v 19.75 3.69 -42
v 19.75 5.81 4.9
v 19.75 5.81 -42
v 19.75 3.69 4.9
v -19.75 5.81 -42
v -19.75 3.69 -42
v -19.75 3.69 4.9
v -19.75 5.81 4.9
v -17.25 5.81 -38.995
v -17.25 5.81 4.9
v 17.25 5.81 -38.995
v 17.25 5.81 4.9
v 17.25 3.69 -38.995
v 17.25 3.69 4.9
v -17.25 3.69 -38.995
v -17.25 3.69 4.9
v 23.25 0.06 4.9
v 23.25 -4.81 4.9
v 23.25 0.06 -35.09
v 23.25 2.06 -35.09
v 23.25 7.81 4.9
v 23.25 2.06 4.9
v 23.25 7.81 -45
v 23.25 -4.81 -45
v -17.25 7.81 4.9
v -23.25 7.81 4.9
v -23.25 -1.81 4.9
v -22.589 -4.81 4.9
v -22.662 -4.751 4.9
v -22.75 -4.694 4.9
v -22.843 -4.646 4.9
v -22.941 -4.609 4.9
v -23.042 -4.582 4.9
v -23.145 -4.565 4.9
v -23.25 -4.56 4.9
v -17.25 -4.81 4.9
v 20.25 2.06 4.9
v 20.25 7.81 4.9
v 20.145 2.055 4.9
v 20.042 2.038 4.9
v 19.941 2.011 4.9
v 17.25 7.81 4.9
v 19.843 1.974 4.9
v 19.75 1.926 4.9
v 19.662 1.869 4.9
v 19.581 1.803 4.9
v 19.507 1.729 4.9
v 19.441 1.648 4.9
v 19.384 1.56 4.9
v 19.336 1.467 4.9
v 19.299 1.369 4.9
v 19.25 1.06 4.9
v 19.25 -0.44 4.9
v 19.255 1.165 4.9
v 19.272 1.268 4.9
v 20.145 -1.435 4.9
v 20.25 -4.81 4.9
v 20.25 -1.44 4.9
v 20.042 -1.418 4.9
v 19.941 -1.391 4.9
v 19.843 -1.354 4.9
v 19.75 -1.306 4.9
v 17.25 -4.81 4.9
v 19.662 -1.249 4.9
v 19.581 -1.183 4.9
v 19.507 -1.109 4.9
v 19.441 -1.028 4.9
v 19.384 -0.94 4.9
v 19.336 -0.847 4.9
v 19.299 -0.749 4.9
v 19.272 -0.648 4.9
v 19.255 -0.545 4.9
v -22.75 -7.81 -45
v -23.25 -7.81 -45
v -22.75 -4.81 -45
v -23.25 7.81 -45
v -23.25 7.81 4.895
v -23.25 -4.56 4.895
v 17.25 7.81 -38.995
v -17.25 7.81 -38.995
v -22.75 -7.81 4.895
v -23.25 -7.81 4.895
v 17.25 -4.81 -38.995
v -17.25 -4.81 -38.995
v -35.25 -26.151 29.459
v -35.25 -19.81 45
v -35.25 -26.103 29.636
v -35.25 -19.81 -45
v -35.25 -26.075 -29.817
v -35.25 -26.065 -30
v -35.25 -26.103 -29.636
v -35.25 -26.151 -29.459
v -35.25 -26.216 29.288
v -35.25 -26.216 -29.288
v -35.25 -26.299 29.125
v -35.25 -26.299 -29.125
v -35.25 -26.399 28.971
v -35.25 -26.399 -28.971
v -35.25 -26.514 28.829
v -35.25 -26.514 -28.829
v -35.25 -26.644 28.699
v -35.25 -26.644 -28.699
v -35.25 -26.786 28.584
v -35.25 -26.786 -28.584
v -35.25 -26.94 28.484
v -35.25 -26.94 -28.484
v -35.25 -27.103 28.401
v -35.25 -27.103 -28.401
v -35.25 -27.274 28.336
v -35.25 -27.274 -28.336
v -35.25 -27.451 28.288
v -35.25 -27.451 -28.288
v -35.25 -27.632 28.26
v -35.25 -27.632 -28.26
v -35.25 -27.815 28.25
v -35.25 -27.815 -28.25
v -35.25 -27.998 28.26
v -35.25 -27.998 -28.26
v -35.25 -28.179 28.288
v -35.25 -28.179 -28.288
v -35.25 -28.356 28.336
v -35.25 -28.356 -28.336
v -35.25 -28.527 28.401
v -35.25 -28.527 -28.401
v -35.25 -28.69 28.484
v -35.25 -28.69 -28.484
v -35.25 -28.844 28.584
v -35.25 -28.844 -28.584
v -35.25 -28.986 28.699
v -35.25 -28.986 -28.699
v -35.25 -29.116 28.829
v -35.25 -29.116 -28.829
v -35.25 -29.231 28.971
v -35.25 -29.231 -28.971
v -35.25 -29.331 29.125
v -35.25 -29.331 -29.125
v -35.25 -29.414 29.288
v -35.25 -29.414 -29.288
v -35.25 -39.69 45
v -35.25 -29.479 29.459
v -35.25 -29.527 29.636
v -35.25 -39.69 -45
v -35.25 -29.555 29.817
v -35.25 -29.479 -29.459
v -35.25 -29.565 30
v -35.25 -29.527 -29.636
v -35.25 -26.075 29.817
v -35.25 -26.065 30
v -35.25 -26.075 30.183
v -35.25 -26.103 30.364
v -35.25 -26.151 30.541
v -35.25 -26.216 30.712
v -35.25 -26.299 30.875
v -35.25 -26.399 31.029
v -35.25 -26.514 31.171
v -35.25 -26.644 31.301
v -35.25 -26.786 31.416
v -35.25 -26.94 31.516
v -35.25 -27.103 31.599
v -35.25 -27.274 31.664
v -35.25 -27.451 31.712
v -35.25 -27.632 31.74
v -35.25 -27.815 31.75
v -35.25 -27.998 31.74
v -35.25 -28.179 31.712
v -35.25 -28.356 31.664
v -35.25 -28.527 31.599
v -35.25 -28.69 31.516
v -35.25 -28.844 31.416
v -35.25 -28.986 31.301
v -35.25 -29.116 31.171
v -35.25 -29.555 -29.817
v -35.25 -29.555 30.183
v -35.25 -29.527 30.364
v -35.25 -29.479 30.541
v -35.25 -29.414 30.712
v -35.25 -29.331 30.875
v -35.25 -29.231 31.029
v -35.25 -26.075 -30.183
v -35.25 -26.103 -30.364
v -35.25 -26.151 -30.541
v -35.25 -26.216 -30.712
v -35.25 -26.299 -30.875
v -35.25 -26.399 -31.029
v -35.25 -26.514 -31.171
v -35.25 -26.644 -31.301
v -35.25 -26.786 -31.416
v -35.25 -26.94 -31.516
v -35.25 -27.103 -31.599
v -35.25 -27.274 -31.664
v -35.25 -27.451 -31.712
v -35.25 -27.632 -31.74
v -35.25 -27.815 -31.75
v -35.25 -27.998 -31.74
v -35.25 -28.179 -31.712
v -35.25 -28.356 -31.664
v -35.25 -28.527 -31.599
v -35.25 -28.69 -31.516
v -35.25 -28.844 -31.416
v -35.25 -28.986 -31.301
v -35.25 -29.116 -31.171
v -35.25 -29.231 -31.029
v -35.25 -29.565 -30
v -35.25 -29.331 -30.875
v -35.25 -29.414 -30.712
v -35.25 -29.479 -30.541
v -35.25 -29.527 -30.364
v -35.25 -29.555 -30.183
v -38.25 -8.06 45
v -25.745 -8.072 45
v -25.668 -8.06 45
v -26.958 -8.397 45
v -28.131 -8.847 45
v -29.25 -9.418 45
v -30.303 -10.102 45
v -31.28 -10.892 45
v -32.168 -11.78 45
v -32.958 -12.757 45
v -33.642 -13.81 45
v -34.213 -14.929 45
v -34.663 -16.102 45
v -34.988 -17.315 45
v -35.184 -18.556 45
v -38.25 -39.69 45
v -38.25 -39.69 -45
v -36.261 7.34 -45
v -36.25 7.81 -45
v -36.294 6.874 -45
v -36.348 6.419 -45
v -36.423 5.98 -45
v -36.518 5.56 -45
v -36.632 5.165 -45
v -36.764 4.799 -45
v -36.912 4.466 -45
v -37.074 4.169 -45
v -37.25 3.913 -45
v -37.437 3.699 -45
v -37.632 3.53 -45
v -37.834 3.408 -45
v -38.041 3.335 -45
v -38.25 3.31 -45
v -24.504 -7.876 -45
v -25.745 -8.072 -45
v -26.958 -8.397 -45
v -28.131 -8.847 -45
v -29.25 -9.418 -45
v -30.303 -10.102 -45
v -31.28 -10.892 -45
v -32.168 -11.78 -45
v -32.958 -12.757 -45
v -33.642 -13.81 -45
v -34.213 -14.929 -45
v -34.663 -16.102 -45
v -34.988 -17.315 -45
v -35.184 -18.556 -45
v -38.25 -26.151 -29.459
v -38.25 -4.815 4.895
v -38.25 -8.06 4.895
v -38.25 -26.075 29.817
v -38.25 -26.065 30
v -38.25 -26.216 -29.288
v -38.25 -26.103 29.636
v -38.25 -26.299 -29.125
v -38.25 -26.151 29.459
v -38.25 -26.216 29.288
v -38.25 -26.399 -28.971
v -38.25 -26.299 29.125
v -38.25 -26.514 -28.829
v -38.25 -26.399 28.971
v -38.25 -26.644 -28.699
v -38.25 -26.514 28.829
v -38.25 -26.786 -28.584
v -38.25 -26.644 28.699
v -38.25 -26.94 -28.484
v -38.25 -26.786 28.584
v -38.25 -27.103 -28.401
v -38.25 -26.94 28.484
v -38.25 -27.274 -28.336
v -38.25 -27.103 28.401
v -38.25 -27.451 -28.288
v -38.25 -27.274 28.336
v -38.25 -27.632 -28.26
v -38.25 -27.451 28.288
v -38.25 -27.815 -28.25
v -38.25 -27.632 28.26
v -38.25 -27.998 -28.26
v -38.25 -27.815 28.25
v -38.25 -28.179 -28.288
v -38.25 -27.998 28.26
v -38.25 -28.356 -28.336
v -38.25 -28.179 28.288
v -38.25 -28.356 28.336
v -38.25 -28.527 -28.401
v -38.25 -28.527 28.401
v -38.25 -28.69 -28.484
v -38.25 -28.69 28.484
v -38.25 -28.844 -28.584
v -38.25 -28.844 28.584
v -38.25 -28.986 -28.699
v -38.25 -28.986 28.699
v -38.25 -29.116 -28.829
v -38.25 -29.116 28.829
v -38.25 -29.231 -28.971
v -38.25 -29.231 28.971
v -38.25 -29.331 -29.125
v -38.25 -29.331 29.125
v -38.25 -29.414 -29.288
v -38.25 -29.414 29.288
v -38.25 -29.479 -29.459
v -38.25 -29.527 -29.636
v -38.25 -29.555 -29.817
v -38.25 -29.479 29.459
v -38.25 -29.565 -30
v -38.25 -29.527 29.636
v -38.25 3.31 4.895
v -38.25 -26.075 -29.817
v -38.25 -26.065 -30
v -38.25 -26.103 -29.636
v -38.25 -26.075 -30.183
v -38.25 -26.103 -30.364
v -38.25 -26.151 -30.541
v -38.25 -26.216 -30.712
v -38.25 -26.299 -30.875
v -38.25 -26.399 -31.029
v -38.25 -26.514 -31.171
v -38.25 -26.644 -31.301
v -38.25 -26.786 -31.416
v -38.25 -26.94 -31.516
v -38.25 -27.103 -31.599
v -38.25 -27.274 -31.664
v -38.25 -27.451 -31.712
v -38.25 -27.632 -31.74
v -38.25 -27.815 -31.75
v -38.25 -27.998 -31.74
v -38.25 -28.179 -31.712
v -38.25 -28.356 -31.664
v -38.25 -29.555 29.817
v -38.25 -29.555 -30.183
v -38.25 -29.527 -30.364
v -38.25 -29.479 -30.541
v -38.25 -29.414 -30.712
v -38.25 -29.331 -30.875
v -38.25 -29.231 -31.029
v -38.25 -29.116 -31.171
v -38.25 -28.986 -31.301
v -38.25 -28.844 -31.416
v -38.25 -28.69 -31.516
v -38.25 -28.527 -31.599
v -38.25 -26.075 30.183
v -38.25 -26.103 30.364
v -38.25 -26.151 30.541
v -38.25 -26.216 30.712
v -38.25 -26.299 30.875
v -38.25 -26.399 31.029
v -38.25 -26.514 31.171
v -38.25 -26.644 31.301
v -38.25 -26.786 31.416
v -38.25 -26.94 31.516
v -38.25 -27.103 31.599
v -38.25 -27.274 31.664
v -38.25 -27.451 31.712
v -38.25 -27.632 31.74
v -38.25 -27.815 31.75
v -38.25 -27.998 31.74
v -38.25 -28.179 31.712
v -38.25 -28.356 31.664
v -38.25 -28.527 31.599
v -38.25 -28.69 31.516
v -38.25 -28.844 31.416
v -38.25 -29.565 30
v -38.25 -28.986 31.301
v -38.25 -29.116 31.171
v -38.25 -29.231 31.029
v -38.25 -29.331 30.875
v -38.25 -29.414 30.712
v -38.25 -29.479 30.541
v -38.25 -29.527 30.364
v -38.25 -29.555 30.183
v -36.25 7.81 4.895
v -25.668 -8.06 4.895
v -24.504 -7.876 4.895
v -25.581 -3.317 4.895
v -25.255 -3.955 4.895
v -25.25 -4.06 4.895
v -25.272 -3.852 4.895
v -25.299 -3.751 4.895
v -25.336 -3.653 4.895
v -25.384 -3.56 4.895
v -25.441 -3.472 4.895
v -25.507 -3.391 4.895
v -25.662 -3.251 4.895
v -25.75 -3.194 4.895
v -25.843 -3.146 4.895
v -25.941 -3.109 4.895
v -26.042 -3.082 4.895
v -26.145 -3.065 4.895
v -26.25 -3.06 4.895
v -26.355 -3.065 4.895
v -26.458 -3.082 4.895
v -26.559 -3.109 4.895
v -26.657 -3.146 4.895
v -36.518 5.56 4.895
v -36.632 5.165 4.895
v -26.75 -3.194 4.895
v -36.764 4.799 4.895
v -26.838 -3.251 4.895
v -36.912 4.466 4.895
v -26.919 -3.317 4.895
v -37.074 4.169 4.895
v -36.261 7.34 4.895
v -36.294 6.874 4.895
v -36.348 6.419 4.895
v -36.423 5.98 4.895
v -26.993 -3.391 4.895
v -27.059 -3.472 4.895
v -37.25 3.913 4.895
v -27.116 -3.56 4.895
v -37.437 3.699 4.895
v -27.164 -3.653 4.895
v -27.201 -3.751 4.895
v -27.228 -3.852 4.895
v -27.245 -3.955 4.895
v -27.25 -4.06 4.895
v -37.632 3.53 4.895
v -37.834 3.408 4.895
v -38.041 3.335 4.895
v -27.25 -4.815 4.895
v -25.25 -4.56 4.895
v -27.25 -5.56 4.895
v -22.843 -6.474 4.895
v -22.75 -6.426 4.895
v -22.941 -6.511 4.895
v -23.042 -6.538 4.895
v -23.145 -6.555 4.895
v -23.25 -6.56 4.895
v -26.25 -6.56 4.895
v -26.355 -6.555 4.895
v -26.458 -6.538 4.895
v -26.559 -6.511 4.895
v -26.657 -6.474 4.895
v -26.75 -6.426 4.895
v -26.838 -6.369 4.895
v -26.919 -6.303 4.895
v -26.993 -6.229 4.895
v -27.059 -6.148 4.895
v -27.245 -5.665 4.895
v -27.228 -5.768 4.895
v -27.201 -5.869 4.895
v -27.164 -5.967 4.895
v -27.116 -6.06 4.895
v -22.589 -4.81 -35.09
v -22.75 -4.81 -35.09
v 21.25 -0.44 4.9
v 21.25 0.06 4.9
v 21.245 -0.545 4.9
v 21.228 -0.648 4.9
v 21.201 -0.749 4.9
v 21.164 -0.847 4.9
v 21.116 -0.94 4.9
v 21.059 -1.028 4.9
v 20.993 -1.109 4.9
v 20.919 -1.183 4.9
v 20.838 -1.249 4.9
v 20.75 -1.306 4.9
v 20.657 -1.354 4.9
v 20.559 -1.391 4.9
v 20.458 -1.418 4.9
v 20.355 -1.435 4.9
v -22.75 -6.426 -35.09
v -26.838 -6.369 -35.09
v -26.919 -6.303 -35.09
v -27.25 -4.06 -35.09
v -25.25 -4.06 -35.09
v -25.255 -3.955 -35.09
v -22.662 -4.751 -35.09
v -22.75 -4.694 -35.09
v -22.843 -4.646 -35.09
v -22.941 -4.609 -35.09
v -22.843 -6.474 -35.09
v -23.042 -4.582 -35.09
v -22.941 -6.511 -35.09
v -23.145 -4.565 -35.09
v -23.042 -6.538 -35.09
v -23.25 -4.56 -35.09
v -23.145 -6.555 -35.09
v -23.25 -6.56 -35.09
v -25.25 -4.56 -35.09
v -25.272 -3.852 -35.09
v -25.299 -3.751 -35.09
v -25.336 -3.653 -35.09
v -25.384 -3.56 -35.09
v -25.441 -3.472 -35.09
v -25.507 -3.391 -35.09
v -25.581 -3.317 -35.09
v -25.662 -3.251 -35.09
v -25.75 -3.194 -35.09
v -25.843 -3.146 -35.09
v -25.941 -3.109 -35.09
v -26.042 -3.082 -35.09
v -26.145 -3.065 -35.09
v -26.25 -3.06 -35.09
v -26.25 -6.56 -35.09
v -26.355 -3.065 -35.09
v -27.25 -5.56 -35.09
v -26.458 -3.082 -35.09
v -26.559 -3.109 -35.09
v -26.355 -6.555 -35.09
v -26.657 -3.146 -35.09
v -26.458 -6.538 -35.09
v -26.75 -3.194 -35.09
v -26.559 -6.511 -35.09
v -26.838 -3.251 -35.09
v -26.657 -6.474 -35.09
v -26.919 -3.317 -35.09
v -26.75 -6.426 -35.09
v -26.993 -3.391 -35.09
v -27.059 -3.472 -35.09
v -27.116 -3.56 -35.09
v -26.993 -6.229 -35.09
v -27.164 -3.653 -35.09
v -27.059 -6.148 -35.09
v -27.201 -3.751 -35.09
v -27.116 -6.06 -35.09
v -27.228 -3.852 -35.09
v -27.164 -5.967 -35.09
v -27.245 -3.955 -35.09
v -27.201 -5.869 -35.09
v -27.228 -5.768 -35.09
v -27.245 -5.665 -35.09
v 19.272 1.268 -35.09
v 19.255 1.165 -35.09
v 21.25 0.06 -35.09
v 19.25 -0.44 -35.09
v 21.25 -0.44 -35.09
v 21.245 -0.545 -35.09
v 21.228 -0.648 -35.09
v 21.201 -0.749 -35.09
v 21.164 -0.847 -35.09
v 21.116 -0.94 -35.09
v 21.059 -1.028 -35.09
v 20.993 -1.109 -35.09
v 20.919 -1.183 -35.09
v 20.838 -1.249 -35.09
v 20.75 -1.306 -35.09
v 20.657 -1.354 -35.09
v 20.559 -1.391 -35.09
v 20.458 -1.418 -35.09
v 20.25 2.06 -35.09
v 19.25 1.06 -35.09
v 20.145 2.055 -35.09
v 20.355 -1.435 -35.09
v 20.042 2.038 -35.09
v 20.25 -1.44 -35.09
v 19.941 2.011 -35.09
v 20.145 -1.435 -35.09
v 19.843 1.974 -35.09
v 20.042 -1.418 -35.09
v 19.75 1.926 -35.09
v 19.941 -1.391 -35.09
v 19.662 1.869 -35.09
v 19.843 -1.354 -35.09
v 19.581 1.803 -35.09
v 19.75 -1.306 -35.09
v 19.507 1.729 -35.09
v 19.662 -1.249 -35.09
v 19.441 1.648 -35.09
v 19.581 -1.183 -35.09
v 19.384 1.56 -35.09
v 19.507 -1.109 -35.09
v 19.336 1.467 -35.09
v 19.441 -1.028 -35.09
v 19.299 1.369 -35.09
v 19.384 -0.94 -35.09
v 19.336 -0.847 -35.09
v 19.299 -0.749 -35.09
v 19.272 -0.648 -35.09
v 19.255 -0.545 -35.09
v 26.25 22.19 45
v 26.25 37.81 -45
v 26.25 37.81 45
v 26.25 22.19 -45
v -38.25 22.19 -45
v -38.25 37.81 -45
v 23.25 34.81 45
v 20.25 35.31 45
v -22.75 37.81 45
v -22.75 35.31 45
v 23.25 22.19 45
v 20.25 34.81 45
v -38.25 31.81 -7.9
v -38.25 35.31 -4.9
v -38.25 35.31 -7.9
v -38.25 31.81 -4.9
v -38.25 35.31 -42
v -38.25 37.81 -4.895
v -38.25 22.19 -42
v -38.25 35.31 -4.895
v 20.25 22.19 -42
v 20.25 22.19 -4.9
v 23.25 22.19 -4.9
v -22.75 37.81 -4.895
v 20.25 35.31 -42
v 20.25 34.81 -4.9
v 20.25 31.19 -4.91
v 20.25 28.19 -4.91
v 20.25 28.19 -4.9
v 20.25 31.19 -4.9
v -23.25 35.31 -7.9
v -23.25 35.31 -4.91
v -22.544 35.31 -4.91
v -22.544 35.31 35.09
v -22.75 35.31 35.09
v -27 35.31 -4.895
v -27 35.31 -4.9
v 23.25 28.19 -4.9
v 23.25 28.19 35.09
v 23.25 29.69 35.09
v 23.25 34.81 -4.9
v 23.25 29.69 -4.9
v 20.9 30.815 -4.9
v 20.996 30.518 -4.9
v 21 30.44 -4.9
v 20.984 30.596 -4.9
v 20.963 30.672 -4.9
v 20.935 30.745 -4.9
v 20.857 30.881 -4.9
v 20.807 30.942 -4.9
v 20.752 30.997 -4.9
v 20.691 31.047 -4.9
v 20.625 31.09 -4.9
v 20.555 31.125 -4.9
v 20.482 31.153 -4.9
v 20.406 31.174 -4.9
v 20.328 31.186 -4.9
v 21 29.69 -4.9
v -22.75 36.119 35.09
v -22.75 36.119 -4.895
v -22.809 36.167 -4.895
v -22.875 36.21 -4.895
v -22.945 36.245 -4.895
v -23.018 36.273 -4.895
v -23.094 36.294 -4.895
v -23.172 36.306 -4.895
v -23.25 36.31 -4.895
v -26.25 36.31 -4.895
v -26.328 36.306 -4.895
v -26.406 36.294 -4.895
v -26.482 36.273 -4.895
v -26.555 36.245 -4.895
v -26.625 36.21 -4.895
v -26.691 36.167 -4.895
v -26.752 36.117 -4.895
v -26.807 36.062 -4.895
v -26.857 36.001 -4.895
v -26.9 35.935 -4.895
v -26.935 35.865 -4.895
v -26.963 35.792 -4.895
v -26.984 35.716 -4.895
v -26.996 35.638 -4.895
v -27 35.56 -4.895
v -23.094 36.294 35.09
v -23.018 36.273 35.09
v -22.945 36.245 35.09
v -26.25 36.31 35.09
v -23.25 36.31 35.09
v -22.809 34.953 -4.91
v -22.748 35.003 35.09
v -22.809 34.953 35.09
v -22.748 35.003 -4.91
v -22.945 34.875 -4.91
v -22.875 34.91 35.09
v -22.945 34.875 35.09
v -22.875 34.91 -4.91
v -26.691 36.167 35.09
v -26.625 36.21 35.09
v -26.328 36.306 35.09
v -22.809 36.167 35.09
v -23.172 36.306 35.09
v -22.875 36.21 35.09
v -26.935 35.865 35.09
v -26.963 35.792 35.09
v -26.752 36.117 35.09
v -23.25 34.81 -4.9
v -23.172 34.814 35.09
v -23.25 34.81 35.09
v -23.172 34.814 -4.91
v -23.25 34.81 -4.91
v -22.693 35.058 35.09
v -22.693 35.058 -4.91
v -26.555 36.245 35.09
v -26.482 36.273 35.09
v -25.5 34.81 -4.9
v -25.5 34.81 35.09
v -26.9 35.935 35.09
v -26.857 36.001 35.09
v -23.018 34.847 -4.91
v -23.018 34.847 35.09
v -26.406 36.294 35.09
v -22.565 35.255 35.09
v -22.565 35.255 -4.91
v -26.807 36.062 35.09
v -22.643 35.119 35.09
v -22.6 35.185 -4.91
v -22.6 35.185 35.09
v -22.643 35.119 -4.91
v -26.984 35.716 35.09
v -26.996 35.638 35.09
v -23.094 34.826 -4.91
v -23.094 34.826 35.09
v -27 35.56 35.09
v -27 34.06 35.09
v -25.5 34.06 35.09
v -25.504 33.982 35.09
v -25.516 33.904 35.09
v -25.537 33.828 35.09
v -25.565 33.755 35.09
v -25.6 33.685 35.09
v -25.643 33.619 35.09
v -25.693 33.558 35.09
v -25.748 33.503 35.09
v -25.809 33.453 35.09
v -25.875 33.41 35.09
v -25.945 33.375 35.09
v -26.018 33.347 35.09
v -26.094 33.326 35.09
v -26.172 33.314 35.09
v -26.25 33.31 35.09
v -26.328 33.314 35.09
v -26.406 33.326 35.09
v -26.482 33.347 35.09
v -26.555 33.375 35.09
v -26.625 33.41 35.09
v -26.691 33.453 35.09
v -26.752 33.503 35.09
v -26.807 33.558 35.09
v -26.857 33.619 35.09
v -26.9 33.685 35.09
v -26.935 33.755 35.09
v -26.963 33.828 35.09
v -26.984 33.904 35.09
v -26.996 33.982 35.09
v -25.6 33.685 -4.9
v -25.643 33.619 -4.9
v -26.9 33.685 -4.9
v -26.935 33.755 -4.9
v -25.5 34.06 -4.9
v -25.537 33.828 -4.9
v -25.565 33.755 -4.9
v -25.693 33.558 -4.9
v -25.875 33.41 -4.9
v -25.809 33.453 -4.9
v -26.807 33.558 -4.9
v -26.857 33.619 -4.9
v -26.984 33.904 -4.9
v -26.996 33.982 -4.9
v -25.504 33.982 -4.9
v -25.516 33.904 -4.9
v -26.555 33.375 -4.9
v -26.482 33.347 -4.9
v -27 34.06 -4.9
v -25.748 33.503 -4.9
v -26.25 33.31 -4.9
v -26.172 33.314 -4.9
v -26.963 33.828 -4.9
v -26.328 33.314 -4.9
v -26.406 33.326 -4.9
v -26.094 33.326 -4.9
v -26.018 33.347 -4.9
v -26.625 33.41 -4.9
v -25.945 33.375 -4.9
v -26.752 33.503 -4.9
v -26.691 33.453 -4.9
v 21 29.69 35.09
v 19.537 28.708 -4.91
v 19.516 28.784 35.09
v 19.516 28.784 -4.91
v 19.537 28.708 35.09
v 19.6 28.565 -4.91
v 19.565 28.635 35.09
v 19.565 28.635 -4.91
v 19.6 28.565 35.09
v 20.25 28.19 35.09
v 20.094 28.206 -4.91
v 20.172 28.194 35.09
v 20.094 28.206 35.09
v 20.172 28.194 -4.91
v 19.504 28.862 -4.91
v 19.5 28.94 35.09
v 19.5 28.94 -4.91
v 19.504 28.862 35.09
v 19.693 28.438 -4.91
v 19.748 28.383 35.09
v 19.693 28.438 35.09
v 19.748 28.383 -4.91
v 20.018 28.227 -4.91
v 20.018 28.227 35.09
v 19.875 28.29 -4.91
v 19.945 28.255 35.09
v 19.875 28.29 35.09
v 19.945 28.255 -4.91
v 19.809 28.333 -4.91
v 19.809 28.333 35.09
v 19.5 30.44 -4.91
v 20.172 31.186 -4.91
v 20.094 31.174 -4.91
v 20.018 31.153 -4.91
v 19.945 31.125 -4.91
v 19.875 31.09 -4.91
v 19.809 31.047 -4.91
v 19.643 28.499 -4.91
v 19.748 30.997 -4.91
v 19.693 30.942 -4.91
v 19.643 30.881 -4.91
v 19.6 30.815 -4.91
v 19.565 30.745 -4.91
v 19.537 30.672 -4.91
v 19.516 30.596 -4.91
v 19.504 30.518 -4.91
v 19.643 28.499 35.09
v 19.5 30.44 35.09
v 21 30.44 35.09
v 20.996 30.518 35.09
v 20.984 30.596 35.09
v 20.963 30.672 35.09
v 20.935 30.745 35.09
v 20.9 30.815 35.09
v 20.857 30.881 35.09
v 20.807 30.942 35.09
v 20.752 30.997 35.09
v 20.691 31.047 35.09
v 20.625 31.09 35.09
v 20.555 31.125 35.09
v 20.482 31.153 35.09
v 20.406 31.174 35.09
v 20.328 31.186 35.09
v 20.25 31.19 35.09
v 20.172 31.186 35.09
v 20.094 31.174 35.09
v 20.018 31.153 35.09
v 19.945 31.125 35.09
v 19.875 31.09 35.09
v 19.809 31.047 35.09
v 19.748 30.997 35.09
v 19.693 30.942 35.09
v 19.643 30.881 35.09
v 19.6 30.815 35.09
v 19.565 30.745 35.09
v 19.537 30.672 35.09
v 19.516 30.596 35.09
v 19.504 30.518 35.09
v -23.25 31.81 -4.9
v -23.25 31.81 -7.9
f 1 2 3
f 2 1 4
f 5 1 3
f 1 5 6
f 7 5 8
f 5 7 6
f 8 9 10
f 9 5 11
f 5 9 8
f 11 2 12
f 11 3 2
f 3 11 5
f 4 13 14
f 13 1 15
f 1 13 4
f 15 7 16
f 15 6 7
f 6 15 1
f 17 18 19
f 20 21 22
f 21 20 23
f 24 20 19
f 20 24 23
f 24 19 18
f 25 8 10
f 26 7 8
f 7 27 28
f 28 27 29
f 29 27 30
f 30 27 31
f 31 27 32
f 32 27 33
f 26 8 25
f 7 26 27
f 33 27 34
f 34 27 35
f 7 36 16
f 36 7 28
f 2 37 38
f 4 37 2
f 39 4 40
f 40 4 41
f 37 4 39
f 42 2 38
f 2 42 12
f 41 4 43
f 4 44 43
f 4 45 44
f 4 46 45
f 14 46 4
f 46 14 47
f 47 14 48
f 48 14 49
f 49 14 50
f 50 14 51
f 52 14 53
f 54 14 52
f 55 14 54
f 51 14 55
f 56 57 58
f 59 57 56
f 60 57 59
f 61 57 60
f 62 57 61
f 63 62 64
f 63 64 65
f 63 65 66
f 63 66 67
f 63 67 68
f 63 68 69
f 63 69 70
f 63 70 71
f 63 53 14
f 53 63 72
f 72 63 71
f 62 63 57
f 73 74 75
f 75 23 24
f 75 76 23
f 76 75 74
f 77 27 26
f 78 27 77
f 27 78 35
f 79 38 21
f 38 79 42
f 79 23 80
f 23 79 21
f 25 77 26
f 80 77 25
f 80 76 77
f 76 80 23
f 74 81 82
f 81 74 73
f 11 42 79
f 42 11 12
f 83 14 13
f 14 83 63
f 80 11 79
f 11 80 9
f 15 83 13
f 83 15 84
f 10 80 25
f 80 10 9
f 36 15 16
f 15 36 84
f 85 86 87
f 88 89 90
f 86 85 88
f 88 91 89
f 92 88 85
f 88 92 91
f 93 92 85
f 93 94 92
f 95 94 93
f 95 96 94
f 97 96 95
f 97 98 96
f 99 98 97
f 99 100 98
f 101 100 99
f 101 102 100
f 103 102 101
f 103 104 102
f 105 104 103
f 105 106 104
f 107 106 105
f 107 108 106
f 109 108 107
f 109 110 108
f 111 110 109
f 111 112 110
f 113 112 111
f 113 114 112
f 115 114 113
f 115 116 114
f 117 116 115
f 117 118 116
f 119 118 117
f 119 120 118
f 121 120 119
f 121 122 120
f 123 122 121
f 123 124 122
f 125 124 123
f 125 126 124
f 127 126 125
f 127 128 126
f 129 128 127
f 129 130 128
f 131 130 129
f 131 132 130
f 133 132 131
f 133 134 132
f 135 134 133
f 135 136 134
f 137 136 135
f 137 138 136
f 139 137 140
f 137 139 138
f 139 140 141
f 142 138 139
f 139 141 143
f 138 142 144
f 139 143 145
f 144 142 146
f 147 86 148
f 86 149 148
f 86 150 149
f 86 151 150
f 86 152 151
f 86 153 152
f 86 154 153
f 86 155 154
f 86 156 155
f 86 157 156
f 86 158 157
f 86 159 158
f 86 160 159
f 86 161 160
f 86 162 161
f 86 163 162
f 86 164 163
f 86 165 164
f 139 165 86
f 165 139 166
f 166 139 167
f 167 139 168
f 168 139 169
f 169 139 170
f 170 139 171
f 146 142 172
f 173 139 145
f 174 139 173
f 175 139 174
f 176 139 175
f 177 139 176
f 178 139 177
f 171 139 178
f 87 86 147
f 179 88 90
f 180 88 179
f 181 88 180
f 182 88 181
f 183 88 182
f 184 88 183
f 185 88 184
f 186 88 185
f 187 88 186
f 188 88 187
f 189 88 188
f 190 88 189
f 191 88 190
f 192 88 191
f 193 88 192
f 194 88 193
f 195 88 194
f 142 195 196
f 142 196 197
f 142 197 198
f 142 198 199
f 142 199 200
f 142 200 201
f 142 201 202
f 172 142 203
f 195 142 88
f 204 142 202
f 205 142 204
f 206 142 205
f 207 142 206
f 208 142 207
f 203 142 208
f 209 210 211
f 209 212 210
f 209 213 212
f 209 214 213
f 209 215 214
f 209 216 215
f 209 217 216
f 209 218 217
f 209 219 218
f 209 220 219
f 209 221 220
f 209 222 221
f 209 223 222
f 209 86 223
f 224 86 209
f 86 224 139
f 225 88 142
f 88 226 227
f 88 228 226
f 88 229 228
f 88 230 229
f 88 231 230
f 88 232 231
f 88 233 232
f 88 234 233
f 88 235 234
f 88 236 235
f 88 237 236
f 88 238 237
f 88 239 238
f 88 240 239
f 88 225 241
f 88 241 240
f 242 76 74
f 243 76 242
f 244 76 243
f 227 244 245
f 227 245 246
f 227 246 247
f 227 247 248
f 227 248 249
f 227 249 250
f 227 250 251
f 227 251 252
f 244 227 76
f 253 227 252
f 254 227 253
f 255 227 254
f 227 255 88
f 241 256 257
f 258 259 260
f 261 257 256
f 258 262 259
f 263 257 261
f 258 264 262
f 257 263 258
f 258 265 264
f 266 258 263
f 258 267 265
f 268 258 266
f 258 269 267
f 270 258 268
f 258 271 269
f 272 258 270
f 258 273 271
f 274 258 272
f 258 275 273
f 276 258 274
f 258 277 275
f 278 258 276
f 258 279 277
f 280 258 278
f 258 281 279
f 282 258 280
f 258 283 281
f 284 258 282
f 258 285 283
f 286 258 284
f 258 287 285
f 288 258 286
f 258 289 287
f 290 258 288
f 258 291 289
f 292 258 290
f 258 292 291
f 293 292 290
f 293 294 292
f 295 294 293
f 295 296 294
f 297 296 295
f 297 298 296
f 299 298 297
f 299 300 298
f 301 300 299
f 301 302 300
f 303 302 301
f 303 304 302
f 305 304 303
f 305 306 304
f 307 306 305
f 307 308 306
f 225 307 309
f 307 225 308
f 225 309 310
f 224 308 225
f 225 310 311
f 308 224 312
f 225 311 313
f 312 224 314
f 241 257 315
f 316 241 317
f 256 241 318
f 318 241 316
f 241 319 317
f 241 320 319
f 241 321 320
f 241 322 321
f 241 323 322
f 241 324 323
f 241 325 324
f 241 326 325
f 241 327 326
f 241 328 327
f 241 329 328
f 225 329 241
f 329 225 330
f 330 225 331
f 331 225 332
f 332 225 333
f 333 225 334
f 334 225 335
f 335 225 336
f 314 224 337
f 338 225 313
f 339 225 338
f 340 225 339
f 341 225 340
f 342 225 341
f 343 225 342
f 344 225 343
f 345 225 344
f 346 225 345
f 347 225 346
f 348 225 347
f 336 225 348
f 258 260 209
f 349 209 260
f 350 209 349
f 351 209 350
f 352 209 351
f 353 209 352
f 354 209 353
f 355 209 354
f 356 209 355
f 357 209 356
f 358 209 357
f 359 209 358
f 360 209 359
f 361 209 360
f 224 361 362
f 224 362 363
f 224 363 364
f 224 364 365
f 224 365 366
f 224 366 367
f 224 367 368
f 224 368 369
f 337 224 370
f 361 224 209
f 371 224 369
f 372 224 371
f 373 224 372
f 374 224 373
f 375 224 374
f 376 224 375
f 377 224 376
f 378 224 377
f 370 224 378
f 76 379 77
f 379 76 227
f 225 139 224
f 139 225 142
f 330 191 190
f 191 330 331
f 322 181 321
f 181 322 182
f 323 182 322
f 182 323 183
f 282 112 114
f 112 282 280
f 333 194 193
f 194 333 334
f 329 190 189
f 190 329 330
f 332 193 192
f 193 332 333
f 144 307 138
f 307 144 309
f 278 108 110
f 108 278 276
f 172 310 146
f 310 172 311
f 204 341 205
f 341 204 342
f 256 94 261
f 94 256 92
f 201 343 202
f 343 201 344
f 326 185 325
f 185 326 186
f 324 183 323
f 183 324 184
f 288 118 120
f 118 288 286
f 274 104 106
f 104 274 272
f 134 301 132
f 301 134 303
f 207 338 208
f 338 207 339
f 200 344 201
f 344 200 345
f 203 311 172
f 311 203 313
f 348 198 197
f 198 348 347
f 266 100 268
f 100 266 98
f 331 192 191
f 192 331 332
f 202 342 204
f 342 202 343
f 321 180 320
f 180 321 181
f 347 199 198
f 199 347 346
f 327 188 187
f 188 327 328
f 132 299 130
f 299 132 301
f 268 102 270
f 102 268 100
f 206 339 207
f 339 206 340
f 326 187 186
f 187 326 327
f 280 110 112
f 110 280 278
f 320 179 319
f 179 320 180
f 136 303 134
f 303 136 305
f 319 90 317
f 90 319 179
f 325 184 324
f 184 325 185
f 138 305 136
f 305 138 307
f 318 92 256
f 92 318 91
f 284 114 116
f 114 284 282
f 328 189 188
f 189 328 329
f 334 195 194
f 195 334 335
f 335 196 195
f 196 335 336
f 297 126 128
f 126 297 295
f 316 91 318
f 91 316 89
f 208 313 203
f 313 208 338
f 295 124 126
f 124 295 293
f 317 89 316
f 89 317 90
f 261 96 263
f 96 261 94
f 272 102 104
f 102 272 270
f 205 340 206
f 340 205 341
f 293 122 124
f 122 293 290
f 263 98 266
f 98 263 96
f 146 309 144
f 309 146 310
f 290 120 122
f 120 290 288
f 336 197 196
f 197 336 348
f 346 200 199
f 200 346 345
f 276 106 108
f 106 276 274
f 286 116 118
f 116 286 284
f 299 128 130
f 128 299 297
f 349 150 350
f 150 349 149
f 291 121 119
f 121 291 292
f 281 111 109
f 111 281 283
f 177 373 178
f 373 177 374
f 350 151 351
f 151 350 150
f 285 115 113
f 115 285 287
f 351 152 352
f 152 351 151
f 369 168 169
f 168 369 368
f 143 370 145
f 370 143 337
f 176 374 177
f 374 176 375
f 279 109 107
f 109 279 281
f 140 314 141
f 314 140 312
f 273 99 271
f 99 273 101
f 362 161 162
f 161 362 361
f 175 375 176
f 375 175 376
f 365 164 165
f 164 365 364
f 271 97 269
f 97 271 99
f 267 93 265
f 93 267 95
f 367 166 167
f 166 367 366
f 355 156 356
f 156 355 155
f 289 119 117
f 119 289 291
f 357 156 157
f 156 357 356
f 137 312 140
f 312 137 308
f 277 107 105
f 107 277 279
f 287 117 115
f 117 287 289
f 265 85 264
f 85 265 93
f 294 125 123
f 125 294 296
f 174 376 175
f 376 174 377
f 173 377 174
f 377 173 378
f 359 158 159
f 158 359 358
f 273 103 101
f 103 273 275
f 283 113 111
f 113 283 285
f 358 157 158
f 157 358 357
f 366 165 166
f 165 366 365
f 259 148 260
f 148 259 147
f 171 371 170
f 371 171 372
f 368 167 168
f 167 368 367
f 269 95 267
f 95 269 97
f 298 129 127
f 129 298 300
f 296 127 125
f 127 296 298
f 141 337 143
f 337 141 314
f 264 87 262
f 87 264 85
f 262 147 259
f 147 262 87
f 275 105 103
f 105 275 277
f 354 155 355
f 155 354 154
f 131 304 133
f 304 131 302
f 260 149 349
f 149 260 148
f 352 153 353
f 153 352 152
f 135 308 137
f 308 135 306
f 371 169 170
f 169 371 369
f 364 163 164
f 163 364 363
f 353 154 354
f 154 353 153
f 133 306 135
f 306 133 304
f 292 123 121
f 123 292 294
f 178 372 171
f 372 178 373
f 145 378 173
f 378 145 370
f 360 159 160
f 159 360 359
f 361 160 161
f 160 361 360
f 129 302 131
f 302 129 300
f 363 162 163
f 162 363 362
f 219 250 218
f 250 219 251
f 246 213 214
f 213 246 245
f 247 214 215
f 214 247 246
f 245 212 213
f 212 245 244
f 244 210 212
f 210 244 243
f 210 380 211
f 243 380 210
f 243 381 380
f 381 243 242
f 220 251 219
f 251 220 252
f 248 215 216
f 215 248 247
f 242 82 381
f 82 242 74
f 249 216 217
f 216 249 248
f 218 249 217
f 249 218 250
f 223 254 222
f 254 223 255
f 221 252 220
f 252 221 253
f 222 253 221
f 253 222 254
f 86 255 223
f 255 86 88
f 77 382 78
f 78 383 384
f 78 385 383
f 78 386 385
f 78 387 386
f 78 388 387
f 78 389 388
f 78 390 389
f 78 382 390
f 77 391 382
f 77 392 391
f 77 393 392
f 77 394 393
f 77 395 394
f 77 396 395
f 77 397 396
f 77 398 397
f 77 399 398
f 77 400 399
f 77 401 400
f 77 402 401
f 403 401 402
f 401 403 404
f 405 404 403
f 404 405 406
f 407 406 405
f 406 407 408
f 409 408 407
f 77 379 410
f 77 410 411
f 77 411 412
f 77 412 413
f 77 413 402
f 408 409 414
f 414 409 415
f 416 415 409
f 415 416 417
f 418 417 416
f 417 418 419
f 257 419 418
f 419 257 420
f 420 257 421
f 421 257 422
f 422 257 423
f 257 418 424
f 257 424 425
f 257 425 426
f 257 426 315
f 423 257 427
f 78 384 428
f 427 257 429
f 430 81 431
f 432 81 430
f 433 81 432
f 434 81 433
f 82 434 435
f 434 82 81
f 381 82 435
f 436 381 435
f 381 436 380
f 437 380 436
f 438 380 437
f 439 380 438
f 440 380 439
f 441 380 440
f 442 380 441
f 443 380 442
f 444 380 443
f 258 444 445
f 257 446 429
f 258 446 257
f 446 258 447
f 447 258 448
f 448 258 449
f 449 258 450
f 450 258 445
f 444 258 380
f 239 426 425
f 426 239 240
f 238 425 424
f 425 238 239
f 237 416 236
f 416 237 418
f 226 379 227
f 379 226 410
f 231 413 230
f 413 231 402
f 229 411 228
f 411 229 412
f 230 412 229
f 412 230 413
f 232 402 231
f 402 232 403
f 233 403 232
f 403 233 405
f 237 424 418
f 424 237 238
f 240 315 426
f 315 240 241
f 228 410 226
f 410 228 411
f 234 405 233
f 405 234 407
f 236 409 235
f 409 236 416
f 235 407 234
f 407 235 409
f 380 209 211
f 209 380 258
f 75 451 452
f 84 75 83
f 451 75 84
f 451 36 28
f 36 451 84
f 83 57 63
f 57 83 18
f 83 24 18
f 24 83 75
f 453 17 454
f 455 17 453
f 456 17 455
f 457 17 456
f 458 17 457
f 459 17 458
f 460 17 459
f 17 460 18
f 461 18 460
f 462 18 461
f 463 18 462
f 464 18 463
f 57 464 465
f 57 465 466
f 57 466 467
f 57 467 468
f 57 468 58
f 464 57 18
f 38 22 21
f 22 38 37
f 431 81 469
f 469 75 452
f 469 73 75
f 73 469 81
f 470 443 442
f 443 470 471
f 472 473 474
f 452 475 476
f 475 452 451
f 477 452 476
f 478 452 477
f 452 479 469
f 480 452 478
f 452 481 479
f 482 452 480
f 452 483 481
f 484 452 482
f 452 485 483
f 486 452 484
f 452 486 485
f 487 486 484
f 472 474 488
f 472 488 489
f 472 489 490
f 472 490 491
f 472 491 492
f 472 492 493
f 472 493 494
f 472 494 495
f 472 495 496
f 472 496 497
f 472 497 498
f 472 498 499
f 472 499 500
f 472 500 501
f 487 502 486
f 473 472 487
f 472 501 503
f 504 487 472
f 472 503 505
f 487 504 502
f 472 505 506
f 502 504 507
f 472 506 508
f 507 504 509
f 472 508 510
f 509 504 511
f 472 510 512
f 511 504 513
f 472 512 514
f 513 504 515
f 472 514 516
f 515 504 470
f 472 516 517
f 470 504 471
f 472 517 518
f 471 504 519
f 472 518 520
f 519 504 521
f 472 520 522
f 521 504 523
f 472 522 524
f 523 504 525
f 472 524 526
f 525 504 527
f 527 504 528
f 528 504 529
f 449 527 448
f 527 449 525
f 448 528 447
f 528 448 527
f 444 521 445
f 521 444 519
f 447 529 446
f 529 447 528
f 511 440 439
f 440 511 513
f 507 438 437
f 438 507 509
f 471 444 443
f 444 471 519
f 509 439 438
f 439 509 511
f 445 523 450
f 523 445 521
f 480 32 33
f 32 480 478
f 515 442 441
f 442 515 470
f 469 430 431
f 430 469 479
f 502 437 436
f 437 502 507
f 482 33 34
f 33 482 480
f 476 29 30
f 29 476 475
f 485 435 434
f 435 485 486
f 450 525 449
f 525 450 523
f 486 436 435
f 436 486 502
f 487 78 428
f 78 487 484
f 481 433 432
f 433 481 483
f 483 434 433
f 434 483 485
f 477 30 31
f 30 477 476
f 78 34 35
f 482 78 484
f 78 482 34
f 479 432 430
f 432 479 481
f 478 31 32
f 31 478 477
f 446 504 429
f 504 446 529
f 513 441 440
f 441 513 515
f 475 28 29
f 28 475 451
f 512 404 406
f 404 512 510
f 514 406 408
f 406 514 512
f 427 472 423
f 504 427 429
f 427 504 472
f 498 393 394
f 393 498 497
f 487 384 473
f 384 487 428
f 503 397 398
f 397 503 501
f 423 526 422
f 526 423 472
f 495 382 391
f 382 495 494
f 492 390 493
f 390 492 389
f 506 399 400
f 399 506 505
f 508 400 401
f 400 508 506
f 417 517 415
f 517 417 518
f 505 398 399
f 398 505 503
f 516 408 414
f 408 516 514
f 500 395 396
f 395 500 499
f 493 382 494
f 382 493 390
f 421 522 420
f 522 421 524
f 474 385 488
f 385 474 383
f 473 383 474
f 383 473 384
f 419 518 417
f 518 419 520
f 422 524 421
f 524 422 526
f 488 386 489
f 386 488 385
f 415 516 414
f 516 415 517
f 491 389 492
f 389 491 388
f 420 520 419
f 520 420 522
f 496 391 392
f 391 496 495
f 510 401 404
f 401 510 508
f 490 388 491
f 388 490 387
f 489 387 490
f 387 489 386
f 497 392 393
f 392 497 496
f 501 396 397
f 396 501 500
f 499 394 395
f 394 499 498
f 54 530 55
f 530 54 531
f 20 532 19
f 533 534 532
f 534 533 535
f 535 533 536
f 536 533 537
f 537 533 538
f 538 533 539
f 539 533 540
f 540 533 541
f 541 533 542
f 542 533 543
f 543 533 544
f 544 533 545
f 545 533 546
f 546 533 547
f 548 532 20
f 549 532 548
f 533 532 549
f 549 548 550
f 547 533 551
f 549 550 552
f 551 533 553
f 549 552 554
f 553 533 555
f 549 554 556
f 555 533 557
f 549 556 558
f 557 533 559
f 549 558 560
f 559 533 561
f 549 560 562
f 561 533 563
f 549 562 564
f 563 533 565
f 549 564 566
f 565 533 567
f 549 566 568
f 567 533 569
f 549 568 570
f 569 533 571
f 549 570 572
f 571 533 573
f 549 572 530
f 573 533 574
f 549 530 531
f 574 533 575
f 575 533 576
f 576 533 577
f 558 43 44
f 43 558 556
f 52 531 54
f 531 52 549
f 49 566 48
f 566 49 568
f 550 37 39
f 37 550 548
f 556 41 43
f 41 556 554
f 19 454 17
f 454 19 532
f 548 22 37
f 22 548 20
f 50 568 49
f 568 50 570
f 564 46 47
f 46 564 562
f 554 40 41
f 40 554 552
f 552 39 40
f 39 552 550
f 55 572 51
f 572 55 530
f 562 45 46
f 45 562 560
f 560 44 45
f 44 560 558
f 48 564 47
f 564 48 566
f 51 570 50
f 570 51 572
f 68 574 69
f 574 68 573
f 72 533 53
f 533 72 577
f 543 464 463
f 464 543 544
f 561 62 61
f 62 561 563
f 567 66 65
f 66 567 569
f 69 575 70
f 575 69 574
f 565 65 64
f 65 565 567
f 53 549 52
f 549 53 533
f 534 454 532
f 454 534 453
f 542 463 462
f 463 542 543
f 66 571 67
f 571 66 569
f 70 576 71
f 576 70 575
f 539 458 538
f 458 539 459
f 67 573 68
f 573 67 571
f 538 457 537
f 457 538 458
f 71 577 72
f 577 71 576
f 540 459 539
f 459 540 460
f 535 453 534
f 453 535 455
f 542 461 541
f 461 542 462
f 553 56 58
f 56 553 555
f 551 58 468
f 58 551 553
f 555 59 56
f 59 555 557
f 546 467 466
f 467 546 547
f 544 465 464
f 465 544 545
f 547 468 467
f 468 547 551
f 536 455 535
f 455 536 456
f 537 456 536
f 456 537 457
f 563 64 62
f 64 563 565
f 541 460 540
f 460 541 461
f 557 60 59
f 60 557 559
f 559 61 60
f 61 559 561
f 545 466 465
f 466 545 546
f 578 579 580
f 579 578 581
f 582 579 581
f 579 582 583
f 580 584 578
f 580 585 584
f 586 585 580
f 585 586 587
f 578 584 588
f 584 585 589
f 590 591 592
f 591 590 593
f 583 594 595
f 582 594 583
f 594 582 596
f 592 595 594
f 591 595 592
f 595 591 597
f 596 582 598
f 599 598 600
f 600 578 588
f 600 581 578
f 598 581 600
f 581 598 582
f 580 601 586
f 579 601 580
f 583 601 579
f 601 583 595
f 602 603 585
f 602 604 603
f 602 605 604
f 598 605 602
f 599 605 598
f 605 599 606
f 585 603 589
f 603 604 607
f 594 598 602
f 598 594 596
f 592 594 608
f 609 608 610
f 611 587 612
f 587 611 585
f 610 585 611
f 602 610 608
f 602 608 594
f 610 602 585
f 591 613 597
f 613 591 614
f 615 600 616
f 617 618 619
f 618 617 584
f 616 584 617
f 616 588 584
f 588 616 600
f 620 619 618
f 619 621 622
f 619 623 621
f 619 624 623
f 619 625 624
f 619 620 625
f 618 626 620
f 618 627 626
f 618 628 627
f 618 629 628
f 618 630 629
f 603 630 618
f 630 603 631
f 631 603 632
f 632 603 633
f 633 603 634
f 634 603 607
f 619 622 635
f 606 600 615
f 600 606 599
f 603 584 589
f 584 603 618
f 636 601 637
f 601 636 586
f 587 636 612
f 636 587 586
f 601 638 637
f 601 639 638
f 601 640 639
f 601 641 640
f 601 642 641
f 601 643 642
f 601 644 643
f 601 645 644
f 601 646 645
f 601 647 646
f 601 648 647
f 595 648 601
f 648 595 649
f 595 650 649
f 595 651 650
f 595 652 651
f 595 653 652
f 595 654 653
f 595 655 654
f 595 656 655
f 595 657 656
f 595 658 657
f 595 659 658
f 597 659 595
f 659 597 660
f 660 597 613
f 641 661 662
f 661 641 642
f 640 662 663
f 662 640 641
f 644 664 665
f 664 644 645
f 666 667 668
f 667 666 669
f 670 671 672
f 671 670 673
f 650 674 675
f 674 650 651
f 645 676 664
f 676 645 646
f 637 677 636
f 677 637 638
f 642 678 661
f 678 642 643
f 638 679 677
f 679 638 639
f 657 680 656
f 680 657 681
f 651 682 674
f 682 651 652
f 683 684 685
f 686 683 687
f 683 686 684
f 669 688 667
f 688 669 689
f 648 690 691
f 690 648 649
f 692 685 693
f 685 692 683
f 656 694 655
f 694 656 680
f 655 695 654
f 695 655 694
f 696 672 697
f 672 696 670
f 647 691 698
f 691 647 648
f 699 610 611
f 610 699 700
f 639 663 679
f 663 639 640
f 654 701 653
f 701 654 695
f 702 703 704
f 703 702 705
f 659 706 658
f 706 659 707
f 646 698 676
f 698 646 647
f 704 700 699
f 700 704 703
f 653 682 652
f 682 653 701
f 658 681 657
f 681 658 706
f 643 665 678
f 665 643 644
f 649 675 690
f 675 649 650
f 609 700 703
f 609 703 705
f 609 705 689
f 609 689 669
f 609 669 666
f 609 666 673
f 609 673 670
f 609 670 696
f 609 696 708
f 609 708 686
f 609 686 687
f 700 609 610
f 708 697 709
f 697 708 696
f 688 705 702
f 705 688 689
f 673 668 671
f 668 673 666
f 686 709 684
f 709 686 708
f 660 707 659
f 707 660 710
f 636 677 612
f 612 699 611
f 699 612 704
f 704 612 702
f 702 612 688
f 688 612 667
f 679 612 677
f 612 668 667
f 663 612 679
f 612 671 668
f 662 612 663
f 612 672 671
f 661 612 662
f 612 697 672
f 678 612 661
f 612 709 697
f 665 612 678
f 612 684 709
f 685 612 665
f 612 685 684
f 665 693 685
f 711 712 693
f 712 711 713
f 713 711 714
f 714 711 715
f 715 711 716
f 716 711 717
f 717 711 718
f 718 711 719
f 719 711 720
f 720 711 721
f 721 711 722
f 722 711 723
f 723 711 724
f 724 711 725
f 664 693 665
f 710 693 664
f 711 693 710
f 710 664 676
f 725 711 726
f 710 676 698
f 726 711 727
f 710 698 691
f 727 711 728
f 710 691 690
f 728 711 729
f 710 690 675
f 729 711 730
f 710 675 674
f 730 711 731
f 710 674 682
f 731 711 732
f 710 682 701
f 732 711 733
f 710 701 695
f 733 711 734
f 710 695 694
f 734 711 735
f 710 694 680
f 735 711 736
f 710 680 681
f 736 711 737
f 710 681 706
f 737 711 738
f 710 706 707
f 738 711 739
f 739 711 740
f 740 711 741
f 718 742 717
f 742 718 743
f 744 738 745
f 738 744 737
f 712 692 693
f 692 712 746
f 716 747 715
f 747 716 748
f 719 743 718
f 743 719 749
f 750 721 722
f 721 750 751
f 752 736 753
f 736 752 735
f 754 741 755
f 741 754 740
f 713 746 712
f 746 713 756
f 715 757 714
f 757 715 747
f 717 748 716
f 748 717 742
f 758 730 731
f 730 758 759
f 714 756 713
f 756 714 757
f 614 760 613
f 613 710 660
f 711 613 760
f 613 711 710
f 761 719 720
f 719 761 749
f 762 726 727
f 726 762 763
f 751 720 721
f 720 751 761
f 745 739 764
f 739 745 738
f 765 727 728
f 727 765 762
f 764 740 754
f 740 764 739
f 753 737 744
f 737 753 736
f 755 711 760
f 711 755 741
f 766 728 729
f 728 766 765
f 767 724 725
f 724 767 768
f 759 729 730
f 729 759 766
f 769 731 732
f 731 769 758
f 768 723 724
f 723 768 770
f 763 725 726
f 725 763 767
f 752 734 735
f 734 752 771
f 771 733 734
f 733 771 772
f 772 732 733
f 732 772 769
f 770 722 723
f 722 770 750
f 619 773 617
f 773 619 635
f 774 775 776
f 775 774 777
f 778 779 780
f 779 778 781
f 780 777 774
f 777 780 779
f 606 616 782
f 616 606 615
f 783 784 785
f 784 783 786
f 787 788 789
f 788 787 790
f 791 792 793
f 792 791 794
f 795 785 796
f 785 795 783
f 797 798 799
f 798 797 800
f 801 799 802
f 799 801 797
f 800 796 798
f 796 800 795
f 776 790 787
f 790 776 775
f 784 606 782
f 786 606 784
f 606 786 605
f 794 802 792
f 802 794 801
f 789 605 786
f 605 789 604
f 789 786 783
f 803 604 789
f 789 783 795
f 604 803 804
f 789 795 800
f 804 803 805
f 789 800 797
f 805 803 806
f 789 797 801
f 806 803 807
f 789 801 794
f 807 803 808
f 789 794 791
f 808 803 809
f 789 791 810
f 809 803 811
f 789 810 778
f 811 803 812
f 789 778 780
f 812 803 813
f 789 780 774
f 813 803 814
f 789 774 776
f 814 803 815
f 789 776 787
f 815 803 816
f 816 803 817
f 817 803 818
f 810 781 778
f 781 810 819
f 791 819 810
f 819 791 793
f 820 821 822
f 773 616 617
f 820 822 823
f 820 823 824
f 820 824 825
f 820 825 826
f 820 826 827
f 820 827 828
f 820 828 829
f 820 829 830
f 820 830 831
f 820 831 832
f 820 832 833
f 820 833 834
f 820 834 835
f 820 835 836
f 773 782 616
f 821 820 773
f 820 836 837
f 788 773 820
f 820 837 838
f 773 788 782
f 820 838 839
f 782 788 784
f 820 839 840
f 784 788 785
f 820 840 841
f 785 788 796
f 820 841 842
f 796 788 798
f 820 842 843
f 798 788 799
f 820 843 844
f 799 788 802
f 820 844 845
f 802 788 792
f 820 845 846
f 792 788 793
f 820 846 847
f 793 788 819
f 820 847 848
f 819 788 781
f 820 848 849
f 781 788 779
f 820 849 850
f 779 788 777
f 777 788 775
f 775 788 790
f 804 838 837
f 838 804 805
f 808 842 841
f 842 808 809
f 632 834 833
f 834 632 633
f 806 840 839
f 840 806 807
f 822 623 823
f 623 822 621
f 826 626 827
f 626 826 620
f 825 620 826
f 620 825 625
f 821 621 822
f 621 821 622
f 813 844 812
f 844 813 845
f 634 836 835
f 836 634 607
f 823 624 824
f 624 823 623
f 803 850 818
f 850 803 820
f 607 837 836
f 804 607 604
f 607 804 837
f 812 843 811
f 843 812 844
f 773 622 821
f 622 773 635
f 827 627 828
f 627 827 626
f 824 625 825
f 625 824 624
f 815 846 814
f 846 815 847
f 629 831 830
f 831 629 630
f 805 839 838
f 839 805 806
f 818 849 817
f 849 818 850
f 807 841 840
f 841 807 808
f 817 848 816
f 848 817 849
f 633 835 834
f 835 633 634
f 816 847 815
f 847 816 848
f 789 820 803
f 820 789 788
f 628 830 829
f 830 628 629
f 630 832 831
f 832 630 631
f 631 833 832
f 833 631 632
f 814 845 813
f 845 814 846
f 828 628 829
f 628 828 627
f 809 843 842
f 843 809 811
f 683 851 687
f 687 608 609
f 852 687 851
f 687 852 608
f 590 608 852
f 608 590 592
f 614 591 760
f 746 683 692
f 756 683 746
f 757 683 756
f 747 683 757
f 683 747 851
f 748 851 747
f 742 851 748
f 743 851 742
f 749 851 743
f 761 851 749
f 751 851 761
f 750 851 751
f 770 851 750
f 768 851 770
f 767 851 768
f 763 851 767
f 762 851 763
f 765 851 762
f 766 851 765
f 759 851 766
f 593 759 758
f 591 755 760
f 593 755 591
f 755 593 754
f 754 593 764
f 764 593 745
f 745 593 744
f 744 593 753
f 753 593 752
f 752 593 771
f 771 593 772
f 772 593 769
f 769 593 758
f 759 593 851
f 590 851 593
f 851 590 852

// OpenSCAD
$fn = 60;
print = true;

beam_depth = 47.5;
corner_a = 8.5;
corner_b = 3.5;

wall_width = 3;
clearance = 0.5;
glass_clearance = 2;
rfid_clearance = 3.5 + 5;
mount_offset = 15;
overall_height = 60 + 30; // must be bigger than the rfid_length plus extra for cable
rivit_hole = 3.5;
rail_height = 40; // must be less than the h_height

rfid_width = 39.5;
rfid_length = 60;
rfid_depth = 1.12;
rfid_hole = 3;
rfid_holes = [
    [rfid_width/2 + 25.5/2, 6.7],
    [rfid_width/2 - 25.5/2, 6.7],
    [rfid_width/2 + 34/2, 44.4],
    [rfid_width/2 - 34/2, 44.4]
];
rfid_pin_hole = 0.9;
rfid_pin_count = 7;
rfid_pin_xy = [10,0.7];
rfid_pin_pitch = 2.54;
rfid_cap_offset = 9.9 + 2.7;

module wall () {
    height = 400;
    thick = beam_depth/2;
    length = 400;
    wthick = 5;
    translate([-thick,-beam_depth,-height/2]) cube([thick, beam_depth, height]);
    translate([-length/2,0,-height/2]) cube([length,wthick,height]);
    translate([0,0,-height/2]) resize([corner_b,0,0]) cylinder(r = corner_a, h = height);
}

module rfid (cutout = false) {
    width = rfid_width;
    depth = rfid_depth + (cutout ? clearance*2 : 0);
    length = rfid_length;
    difference() {
        union() {
            cube([width,depth,length], center=true);
            cap_height = 3.5;
            cap_width = 3.5;
            cap_length = 9.9;
            translate([-cap_width/2+width/2,-cap_height/2-depth/2,cap_length/2+length/2-rfid_cap_offset]) {
                cube([cap_width,cap_height,cap_length], center=true);
            }
        }
        if (!cutout) {
            translate([-width/2,0,-length/2]) {
                for (h = rfid_holes) {
                    translate([h[0],0,h[1]]) rotate([90,0,0]) cylinder(d = rfid_hole, h=depth + 0.02, center=true);
                }
            }
            translate([-width/2+rfid_pin_xy[0]+rfid_pin_pitch/2,0,length/2-rfid_pin_xy[1]-rfid_pin_pitch/2]) {
                for (p = [0 : 1 : rfid_pin_count]) {
                    translate([p * rfid_pin_pitch,0,0]) rotate([90,0,0]) cylinder(d = rfid_pin_hole, h=depth + 0.02, center=true);
                }
            }
        }
    }
}

h_width = rfid_width + wall_width * 2 + clearance * 2;
h_height = rfid_length - rfid_cap_offset - clearance + wall_width;
h_depth = glass_clearance + rfid_depth + rfid_clearance + clearance * 2 + wall_width;
module holder(side = -1) {
    difference() {
        union() {
            cube([h_width,h_depth,h_height], center=true);
        }
        translate([0,0,wall_width+0.01]) cube([h_width-wall_width*4,h_depth+0.02,h_height-wall_width*2+0.01], center=true);
        translate([0,h_depth/2-rfid_depth/2-glass_clearance-clearance,rfid_length/2-h_height/2+wall_width]) rfid(true);
    }

    // Mounting bracket
    spacer_width = mount_offset-wall_width;
    spacer_length = h_depth + spacer_width;
    translate([(h_width/2-wall_width/2+mount_offset)*side,-beam_depth/2+h_depth/2,overall_height/2-h_height/2]) {
        difference() {
            union() {
                cube([wall_width,beam_depth,overall_height], center=true);
                translate([(-spacer_width/2-wall_width/2)*side,beam_depth/2-spacer_length/2,0]) cube([spacer_width,spacer_length,overall_height], center=true);
            }
            translate([(-spacer_width-wall_width/2)*side,beam_depth/2-spacer_length,0]) cylinder(r = spacer_width, h=overall_height+0.02, center=true);
            translate([(-mount_offset/2+wall_width/2)*side,+beam_depth/2-h_depth/2+wall_width/2,h_height/2]) {
                cube([mount_offset+0.02,h_depth+0.01-wall_width,overall_height-h_height+0.01], center=true);
            }
            for (i = [-overall_height/3, overall_height/3]) {
                translate([0,-beam_depth/4,i]) rotate([0,90,0]) cylinder(d = rivit_hole, center=true, h=wall_width+0.02);
            }

            // Create a space for the corner tube
            c_a = corner_a + clearance;
            c_b = corner_b + clearance;
            translate([wall_width/2*side,beam_depth/2,0]) resize([c_b,0,0]) cylinder(d = c_a, h=overall_height + 0.02, center=true);
        }
    }
}

module rail(size, height, rotation, clearance) {
    hull() {
        cylinder(d=size/2+clearance, h=height, center = true);
        translate([-size,0,0]) cylinder(d=size/2+clearance, h=height, center = true);
    }
    hull () {
        translate([-size,0,0]) cylinder(d=size/2+clearance, h=height, center = true);
        translate([-size,0,0]) rotate(rotation) translate([-size/2,0,0]) cylinder(d=size/2+clearance, h=height, center = true);
    }
}

c_height = overall_height;
c_width = h_width + mount_offset+wall_width;
c_depth = h_depth;
module cover(cutout = false, side = -1) {
    width = c_width;
    height = c_height;
    depth = c_depth;
    translate([-wall_width/2*side,0,0]) {
        difference() {
            cube([width+(cutout?clearance:0),depth+(cutout?clearance:0),height+(cutout?clearance:0)], center=true);
            translate([wall_width*2*side,wall_width/2+(cutout?clearance:0),-wall_width/2-5]) cube([width,depth-wall_width+1,height-wall_width+10], center=true);
            translate([wall_width*side,wall_width,-height+h_height]) cube([width,depth,height], center=true);
            translate([(width/2-mount_offset/2)*side,-depth/2+wall_width/2,-height/2+h_height/2-0.01]) cube([mount_offset+1,wall_width+2,h_height+0.01], center=true);
        }
    }
    // rails
    translate([(c_width/2-mount_offset/2-wall_width/2)*side,-c_depth/2+wall_width,-c_height/2+wall_width/2+h_height]) cube([mount_offset,wall_width*2,wall_width], center=true);
    translate([0,0,-height/2-rail_height/2+h_height]) {
        translate ([(width/2-mount_offset-wall_width/2)*side,-depth/2+wall_width-wall_width/4,0.01]) {
            rotate(side == 1 ? 180 : 0) rail(wall_width, rail_height, 90*side, cutout ? clearance : 0);
        }
        translate ([(-c_width/2+wall_width/2)*side,c_depth/2-wall_width/4-wall_width*2,0.01]) {
            rotate(side == 1 ? 180 : 0) rail(wall_width, rail_height, 270*side, cutout ? clearance : 0);
        }
    }
}

if (!print) {
    //%translate([(mount_offset+beam_depth/2)*side,0,0]) wall();
    %translate([0,0,-overall_height/2+rfid_length/2+wall_width]) rfid();
}

side = -1;
difference() {
    translate([0,0,h_height/2-overall_height/2]) holder(side);
    translate([mount_offset/2*side,0,0]) cover(true, side);

}
translate([(-c_width/2+h_width/2+mount_offset+wall_width/2)*side,(print ? 30 : 0),0]) {
    rotate ([print ? 180 : 0,0,0]) cover(false, side);
}
